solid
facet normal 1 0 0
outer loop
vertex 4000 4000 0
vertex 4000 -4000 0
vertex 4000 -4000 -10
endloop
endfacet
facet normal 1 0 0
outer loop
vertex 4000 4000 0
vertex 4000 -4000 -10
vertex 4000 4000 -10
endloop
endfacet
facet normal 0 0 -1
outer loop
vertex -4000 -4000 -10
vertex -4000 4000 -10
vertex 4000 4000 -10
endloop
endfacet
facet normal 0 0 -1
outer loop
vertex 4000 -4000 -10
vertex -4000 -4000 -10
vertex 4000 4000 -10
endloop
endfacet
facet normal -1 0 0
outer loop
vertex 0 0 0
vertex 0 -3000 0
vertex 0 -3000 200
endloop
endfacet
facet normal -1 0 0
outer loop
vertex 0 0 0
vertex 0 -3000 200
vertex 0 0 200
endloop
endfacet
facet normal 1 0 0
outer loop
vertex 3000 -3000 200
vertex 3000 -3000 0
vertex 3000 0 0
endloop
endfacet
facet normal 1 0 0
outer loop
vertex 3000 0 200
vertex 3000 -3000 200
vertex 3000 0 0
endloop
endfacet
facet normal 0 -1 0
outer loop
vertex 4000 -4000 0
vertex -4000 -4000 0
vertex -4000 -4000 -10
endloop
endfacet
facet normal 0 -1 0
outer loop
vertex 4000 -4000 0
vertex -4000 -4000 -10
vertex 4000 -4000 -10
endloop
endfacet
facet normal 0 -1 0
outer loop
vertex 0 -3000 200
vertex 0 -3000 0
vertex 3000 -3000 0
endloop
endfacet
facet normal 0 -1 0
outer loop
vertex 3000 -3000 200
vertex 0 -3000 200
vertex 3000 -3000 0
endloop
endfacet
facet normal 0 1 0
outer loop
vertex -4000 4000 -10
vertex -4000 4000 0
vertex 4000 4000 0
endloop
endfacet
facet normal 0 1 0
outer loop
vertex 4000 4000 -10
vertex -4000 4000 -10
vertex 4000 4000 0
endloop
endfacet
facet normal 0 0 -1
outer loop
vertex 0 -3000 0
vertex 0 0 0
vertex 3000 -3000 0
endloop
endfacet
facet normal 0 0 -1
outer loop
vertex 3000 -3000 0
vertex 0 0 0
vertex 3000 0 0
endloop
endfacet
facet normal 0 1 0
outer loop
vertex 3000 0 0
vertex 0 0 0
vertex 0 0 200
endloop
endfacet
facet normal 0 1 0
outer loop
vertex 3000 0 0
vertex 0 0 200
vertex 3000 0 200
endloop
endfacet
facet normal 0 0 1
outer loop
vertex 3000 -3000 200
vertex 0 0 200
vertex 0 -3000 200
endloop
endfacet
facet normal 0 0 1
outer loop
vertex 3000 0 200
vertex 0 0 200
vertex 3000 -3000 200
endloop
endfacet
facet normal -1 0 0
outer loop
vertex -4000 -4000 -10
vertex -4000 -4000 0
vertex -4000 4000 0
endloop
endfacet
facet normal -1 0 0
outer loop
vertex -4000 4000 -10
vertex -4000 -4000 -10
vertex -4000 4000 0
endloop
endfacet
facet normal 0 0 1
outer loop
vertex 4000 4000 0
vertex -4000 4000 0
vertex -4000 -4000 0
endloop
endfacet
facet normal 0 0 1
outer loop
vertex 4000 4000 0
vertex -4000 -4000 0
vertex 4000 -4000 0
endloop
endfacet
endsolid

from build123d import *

# Parameters (mm, degrees)
F0_W     = 8000
F0_H     = 8000
F1_DEPTH = 10
F2_W     = 3000
F2_H     = 3000
F3_DEPTH = 200


with BuildPart() as f1:
    # F0 (on Top) → F1 (new body)
    with BuildSketch(Plane.XY):
        Rectangle(F0_W, F0_H)
    extrude(amount=-F1_DEPTH)


with BuildPart() as f3:
    # F2 (on face) → F3 (new body)
    with BuildSketch(Plane.XY):
        with Locations((1500, -1500)):
            Rectangle(F2_W, F2_H)
    extrude(amount=F3_DEPTH)


solid = Compound([f1.part, f3.part])
